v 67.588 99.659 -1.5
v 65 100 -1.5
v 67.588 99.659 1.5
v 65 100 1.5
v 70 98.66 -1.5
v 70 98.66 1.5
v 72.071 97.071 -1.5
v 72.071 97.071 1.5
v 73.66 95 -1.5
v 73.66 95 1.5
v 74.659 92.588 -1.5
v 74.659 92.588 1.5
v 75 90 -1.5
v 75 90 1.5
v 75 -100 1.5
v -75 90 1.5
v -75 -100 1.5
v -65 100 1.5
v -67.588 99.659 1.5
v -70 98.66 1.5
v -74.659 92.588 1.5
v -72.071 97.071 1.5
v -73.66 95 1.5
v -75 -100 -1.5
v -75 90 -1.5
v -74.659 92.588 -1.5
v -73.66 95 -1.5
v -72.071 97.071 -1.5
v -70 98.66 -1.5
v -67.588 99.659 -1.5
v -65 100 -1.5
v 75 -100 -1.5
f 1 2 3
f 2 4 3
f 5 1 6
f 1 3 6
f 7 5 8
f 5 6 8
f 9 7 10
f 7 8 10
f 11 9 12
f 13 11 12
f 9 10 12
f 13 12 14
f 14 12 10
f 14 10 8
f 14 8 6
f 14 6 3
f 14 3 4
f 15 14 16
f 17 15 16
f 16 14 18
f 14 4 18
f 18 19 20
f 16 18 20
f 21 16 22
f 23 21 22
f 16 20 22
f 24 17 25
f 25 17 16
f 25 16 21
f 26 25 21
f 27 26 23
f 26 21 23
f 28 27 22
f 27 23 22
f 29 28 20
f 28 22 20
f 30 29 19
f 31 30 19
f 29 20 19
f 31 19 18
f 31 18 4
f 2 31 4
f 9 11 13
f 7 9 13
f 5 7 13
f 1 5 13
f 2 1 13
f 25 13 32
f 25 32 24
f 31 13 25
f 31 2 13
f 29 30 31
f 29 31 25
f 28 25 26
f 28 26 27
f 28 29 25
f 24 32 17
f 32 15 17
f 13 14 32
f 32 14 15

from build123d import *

# Parameters (mm, degrees)
EXTRUDE_1_DEPTH = 1.5


with BuildPart() as part:
    # Эскиз1 → Бобышка-Вытянуть1 (new, symmetric)
    with BuildSketch(Plane.XY):
        with BuildLine():
            Line((-65, 100), (65, 100))
            ThreePointArc((65, 100), (72.071067812, 97.071067812), (75, 90))
            Line((75, 90), (75, -100))
            Line((75, -100), (-75, -100))
            Line((-75, -100), (-75, 90))
            ThreePointArc((-75, 90), (-72.071067812, 97.071067812), (-65, 100))
        make_face()
    extrude(amount=EXTRUDE_1_DEPTH, both=True)


solid = part.part
